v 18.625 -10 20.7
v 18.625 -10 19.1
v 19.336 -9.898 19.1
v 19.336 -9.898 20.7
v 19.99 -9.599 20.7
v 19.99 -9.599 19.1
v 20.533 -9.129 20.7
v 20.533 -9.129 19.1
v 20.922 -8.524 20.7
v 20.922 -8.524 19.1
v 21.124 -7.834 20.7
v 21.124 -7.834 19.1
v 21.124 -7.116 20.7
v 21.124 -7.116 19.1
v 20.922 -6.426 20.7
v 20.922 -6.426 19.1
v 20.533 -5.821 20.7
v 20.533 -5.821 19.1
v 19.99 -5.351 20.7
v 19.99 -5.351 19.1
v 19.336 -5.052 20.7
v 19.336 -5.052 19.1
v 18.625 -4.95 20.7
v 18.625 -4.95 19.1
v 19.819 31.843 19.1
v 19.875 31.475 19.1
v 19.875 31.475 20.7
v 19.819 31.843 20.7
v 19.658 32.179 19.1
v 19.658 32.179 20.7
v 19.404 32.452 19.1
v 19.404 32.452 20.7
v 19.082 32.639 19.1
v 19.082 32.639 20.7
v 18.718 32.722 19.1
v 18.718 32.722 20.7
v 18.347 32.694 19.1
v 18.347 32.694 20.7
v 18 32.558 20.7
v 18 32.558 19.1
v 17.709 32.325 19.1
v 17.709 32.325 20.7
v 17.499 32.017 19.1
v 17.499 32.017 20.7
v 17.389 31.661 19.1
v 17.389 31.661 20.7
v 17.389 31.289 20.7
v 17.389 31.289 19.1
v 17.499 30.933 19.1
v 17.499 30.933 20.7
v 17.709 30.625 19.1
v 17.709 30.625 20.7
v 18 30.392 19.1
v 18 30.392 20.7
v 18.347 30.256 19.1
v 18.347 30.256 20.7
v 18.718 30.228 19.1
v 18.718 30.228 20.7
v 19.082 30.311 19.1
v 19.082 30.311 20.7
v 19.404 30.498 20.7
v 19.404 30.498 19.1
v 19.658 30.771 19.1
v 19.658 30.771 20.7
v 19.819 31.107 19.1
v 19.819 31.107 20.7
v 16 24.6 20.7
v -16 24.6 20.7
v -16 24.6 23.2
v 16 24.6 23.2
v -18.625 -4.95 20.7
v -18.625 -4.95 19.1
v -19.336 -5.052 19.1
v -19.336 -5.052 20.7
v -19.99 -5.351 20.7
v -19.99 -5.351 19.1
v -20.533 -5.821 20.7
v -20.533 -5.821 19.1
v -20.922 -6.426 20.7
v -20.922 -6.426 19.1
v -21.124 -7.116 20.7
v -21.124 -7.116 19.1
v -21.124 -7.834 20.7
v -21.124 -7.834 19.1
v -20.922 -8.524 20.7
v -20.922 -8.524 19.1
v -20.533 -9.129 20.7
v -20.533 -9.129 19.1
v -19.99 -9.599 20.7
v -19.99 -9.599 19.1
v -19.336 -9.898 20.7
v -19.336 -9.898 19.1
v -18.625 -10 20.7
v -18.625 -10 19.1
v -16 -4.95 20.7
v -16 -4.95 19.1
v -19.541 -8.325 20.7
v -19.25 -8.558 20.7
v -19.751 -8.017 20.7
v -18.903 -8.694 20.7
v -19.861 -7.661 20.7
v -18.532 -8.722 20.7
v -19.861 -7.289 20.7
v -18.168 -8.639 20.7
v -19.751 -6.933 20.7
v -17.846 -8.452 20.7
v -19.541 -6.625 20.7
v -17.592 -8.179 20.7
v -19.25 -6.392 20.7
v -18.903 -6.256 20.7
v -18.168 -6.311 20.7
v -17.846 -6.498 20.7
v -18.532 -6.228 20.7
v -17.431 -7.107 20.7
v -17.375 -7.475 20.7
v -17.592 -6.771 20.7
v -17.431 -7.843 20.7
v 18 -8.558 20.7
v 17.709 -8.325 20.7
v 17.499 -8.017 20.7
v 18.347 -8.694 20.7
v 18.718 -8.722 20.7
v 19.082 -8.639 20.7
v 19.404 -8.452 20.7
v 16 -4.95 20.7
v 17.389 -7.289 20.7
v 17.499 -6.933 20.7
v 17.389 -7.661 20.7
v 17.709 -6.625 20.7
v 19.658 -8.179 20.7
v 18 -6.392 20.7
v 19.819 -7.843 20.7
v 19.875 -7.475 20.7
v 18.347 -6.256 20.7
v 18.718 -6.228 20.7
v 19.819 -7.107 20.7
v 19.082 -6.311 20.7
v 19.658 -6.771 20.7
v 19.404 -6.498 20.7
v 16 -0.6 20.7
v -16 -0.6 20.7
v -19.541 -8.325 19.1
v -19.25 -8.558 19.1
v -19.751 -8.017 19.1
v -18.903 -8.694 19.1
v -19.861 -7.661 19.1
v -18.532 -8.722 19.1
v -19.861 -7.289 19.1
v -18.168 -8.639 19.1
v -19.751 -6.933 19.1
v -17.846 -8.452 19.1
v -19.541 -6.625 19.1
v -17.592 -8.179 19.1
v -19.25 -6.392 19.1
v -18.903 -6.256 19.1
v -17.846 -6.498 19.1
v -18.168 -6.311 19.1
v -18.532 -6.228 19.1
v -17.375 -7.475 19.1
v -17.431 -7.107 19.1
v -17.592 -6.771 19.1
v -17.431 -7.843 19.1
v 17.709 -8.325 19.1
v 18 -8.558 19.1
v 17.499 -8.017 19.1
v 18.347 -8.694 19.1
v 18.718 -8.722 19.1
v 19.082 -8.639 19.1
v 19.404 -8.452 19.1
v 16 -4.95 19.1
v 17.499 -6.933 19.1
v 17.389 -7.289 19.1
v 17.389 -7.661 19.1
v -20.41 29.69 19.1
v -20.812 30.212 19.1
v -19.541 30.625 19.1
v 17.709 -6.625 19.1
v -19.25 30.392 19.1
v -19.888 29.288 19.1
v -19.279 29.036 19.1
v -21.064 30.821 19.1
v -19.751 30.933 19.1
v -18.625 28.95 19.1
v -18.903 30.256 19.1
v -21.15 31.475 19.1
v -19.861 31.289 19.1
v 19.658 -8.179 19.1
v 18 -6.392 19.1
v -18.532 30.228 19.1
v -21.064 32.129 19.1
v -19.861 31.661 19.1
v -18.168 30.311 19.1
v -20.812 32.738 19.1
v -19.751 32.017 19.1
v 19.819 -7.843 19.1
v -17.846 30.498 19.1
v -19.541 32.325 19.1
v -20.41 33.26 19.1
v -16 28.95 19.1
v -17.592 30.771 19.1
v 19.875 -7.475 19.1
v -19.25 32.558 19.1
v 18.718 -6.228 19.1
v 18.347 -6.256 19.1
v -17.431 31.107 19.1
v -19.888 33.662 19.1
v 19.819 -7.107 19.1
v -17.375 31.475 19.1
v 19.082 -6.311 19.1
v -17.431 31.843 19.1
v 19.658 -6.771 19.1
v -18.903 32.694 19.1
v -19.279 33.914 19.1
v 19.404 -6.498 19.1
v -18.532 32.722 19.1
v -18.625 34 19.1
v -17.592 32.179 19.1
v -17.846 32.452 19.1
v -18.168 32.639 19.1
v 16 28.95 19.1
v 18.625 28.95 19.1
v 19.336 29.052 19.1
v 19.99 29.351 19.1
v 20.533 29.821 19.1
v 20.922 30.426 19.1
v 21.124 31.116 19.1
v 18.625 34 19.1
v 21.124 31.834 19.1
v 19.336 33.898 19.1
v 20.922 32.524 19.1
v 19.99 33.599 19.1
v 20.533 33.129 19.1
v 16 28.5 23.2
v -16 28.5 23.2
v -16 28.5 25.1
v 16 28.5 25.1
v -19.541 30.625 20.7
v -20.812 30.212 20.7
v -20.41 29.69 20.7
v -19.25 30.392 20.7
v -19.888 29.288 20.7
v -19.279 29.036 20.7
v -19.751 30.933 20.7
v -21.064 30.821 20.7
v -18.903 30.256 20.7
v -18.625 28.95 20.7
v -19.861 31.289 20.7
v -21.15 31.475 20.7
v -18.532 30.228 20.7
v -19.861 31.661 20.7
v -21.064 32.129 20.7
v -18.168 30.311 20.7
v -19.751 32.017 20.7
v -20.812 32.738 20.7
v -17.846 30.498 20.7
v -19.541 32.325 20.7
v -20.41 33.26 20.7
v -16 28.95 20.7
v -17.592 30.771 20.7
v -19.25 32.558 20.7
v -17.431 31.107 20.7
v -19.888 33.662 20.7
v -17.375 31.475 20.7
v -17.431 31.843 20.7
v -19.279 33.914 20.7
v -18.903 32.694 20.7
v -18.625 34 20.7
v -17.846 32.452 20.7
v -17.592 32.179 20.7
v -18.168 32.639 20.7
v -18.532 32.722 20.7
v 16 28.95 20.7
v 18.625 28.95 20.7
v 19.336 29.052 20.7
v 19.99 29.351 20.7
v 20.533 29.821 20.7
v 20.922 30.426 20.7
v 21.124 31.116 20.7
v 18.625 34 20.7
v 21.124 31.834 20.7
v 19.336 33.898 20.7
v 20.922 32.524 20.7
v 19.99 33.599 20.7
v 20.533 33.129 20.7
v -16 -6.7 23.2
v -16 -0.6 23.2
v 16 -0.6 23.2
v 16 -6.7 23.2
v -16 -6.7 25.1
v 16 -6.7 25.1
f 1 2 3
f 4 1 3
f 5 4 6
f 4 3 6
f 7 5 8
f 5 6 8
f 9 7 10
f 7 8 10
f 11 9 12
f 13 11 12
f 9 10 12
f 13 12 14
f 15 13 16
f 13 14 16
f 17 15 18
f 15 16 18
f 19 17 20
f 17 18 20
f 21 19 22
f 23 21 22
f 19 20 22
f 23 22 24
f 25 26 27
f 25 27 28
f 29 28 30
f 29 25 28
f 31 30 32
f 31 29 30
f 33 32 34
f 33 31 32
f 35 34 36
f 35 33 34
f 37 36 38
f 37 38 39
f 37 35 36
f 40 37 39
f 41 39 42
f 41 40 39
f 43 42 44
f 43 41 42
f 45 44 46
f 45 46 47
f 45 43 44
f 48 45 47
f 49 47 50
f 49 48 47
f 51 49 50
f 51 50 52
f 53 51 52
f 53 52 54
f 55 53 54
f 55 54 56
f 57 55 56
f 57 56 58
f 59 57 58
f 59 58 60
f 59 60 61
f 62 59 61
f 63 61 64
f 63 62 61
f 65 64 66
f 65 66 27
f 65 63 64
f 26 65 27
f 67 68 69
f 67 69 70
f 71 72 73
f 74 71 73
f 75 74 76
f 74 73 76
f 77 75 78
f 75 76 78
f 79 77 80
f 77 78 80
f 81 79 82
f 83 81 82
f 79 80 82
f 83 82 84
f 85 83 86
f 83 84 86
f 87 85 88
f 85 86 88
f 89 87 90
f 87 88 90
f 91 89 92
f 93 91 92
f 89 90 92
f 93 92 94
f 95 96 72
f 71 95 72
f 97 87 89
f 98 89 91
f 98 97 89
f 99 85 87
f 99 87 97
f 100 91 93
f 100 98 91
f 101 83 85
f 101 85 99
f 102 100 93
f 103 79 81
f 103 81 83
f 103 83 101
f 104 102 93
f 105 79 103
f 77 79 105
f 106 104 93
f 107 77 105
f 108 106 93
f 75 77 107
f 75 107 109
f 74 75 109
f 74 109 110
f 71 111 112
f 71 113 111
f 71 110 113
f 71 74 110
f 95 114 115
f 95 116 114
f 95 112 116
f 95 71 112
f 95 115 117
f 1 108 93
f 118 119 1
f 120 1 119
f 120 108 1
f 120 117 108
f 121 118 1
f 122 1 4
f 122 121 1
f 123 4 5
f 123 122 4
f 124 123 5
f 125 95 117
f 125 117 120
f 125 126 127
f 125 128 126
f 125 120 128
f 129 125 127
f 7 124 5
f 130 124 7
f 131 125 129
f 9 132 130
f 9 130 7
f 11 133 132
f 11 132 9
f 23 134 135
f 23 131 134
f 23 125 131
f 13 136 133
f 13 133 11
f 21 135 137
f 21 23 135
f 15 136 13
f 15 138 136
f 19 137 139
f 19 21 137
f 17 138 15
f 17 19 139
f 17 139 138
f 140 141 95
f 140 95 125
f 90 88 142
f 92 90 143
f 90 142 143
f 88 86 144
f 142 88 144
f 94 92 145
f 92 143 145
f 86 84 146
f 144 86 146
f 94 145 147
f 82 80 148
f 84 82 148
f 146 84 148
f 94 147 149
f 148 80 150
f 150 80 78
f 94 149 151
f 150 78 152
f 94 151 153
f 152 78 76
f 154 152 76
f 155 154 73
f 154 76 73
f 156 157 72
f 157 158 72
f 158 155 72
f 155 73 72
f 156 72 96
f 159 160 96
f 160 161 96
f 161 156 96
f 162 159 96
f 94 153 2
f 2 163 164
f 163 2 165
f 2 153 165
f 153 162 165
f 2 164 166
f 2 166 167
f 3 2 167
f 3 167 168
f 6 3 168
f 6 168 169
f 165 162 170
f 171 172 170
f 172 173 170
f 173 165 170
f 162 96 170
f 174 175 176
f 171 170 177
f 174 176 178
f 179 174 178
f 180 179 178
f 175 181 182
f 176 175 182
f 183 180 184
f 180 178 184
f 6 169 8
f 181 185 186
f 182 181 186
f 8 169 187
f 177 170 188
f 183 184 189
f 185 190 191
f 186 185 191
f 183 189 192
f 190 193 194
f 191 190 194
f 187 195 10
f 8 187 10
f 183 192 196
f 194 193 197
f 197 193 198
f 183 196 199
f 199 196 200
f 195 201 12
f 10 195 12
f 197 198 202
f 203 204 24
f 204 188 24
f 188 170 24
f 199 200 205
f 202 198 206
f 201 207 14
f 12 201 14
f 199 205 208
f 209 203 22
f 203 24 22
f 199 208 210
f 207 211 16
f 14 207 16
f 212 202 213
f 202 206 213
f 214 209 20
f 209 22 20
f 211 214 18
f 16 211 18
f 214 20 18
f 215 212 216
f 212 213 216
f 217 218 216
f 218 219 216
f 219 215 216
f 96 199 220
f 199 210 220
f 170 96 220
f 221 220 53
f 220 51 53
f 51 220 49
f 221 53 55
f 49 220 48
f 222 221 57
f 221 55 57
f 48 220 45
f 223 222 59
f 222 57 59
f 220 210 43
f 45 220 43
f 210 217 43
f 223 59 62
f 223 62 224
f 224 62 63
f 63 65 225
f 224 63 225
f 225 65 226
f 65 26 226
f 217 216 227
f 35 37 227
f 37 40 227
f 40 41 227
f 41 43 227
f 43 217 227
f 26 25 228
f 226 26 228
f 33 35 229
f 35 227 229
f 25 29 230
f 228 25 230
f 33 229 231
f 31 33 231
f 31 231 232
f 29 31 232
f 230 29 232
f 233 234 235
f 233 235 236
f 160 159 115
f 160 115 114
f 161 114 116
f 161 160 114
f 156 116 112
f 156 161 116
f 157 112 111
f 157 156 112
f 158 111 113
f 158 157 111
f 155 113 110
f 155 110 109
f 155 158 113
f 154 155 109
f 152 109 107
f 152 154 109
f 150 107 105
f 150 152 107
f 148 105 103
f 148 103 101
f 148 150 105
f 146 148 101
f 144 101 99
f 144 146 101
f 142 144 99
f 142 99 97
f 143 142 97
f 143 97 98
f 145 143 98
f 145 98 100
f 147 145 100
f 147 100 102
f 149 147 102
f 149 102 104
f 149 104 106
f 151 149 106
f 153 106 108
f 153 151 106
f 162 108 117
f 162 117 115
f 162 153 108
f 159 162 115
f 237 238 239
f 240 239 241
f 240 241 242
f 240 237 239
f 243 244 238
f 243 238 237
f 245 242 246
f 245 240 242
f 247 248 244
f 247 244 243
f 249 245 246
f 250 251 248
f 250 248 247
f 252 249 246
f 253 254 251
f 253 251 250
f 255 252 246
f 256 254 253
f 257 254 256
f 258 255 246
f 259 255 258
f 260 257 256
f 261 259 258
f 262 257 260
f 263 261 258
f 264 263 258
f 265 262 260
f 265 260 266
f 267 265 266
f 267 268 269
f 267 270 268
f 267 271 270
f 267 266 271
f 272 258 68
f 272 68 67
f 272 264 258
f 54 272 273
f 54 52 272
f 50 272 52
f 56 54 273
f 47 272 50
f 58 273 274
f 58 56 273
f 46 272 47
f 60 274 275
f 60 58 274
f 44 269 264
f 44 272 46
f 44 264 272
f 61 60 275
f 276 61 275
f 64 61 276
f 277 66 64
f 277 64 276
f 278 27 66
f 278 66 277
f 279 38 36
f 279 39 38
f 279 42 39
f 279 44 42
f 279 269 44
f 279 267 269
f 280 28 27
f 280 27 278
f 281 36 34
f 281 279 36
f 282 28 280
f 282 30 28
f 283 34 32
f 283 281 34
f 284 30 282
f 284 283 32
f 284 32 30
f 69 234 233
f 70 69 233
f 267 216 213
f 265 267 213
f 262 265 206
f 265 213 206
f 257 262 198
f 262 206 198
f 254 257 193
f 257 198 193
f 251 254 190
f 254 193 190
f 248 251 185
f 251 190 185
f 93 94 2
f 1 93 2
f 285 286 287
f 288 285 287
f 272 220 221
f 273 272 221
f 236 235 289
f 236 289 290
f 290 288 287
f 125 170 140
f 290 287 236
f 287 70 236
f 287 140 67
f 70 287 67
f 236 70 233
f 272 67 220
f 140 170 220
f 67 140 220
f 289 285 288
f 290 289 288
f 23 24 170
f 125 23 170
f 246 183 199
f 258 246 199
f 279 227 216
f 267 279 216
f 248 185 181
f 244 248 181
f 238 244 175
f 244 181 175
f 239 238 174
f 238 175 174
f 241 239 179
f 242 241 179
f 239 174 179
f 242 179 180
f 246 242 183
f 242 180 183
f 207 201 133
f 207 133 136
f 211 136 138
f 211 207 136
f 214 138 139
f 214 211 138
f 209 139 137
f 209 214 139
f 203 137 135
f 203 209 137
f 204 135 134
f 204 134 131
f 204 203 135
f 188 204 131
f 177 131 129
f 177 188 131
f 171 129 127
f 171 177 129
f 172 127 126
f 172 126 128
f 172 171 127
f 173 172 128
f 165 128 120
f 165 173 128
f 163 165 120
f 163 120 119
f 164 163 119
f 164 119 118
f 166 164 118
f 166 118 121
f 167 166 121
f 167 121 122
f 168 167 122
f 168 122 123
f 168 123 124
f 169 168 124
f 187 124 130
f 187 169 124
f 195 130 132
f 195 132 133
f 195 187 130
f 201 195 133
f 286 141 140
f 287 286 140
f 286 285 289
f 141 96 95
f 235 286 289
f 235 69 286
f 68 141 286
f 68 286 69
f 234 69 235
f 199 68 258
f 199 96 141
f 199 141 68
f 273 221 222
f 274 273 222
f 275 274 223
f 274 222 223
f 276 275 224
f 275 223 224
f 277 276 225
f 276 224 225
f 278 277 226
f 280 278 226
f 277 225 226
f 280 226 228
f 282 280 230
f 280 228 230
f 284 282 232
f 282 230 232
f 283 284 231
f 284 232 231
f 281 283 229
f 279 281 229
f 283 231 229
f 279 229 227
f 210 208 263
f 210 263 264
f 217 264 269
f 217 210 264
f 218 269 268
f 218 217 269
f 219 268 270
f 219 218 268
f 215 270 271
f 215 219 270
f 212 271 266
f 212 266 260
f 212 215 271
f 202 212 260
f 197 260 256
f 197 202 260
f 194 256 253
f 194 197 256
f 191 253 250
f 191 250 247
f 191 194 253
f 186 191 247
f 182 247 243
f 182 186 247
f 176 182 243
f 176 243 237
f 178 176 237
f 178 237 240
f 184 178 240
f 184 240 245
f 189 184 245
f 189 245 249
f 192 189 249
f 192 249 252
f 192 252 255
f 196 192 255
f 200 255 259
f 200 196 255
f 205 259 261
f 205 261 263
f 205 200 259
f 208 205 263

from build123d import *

# Parameters (mm, degrees)
SKETCH073_W  = 32
SKETCH073_H  = 44
PAD037_DEPTH = 1.6
SKETCH074_W  = 32
SKETCH074_H  = 25.2
PAD038_DEPTH = 2.5
SKETCH075_W  = 32
SKETCH075_H  = 35.2
PAD039_DEPTH = 1.9
SKETCH076_R  = 1.25
PAD040_DEPTH = 1.6


with BuildPart() as part:
    # Sketch073 → Pad037 (new body)
    with BuildSketch(Plane.XY):
        Rectangle(SKETCH073_W, SKETCH073_H)
    extrude(amount=PAD037_DEPTH)

    # Sketch074 → Pad038 (join)
    with BuildSketch(Plane.XY.offset(1.6)):
        Rectangle(SKETCH074_W, SKETCH074_H)
    extrude(amount=PAD038_DEPTH)

    # Sketch075 → Pad039 (join)
    with BuildSketch(Plane.XY.offset(4.1)):
        with Locations((0, -1.1)):
            Rectangle(SKETCH075_W, SKETCH075_H)
    extrude(amount=PAD039_DEPTH)

    # Sketch076 → Pad040 (join)
    with BuildSketch(Plane.XY):
        with BuildLine():
            Line((16, 22), (16, 16.95))
            Line((16, 16.95), (18.625, 16.95))
            ThreePointArc((18.625, 16.95), (21.15, 19.475), (18.625, 22))
            Line((18.625, 22), (16, 22))
        make_face()
        with Locations((18.625, 19.475)):
            Circle(SKETCH076_R, mode=Mode.SUBTRACT)
        with BuildLine():
            Line((16, -22), (18.625, -22))
            ThreePointArc((18.625, -22), (21.15, -19.475), (18.625, -16.95))
            Line((18.625, -16.95), (16, -16.95))
            Line((16, -16.95), (16, -22))
        make_face()
        with Locations((18.625, -19.475)):
            Circle(SKETCH076_R, mode=Mode.SUBTRACT)
        with BuildLine():
            Line((-16, -22), (-16, -16.95))
            Line((-16, -16.95), (-18.625, -16.95))
            ThreePointArc((-18.625, -16.95), (-21.15, -19.475), (-18.625, -22))
            Line((-18.625, -22), (-16, -22))
        make_face()
        with Locations((-18.625, -19.475)):
            Circle(SKETCH076_R, mode=Mode.SUBTRACT)
        with BuildLine():
            Line((-16, 22), (-18.625, 22))
            ThreePointArc((-18.625, 22), (-20.410445, 21.260445), (-21.15, 19.475))
            ThreePointArc((-21.15, 19.475), (-20.410445, 17.689555), (-18.625, 16.95))
            Line((-18.625, 16.95), (-16, 16.95))
            Line((-16, 16.95), (-16, 22))
        make_face()
        with Locations((-18.625, 19.475)):
            Circle(SKETCH076_R, mode=Mode.SUBTRACT)
    extrude(amount=PAD040_DEPTH)


with BuildPart() as part_1:
    # Body011 placement: moved
    add(part.part.moved(Location((0, 12, 19.1))))


solid = part_1.part
